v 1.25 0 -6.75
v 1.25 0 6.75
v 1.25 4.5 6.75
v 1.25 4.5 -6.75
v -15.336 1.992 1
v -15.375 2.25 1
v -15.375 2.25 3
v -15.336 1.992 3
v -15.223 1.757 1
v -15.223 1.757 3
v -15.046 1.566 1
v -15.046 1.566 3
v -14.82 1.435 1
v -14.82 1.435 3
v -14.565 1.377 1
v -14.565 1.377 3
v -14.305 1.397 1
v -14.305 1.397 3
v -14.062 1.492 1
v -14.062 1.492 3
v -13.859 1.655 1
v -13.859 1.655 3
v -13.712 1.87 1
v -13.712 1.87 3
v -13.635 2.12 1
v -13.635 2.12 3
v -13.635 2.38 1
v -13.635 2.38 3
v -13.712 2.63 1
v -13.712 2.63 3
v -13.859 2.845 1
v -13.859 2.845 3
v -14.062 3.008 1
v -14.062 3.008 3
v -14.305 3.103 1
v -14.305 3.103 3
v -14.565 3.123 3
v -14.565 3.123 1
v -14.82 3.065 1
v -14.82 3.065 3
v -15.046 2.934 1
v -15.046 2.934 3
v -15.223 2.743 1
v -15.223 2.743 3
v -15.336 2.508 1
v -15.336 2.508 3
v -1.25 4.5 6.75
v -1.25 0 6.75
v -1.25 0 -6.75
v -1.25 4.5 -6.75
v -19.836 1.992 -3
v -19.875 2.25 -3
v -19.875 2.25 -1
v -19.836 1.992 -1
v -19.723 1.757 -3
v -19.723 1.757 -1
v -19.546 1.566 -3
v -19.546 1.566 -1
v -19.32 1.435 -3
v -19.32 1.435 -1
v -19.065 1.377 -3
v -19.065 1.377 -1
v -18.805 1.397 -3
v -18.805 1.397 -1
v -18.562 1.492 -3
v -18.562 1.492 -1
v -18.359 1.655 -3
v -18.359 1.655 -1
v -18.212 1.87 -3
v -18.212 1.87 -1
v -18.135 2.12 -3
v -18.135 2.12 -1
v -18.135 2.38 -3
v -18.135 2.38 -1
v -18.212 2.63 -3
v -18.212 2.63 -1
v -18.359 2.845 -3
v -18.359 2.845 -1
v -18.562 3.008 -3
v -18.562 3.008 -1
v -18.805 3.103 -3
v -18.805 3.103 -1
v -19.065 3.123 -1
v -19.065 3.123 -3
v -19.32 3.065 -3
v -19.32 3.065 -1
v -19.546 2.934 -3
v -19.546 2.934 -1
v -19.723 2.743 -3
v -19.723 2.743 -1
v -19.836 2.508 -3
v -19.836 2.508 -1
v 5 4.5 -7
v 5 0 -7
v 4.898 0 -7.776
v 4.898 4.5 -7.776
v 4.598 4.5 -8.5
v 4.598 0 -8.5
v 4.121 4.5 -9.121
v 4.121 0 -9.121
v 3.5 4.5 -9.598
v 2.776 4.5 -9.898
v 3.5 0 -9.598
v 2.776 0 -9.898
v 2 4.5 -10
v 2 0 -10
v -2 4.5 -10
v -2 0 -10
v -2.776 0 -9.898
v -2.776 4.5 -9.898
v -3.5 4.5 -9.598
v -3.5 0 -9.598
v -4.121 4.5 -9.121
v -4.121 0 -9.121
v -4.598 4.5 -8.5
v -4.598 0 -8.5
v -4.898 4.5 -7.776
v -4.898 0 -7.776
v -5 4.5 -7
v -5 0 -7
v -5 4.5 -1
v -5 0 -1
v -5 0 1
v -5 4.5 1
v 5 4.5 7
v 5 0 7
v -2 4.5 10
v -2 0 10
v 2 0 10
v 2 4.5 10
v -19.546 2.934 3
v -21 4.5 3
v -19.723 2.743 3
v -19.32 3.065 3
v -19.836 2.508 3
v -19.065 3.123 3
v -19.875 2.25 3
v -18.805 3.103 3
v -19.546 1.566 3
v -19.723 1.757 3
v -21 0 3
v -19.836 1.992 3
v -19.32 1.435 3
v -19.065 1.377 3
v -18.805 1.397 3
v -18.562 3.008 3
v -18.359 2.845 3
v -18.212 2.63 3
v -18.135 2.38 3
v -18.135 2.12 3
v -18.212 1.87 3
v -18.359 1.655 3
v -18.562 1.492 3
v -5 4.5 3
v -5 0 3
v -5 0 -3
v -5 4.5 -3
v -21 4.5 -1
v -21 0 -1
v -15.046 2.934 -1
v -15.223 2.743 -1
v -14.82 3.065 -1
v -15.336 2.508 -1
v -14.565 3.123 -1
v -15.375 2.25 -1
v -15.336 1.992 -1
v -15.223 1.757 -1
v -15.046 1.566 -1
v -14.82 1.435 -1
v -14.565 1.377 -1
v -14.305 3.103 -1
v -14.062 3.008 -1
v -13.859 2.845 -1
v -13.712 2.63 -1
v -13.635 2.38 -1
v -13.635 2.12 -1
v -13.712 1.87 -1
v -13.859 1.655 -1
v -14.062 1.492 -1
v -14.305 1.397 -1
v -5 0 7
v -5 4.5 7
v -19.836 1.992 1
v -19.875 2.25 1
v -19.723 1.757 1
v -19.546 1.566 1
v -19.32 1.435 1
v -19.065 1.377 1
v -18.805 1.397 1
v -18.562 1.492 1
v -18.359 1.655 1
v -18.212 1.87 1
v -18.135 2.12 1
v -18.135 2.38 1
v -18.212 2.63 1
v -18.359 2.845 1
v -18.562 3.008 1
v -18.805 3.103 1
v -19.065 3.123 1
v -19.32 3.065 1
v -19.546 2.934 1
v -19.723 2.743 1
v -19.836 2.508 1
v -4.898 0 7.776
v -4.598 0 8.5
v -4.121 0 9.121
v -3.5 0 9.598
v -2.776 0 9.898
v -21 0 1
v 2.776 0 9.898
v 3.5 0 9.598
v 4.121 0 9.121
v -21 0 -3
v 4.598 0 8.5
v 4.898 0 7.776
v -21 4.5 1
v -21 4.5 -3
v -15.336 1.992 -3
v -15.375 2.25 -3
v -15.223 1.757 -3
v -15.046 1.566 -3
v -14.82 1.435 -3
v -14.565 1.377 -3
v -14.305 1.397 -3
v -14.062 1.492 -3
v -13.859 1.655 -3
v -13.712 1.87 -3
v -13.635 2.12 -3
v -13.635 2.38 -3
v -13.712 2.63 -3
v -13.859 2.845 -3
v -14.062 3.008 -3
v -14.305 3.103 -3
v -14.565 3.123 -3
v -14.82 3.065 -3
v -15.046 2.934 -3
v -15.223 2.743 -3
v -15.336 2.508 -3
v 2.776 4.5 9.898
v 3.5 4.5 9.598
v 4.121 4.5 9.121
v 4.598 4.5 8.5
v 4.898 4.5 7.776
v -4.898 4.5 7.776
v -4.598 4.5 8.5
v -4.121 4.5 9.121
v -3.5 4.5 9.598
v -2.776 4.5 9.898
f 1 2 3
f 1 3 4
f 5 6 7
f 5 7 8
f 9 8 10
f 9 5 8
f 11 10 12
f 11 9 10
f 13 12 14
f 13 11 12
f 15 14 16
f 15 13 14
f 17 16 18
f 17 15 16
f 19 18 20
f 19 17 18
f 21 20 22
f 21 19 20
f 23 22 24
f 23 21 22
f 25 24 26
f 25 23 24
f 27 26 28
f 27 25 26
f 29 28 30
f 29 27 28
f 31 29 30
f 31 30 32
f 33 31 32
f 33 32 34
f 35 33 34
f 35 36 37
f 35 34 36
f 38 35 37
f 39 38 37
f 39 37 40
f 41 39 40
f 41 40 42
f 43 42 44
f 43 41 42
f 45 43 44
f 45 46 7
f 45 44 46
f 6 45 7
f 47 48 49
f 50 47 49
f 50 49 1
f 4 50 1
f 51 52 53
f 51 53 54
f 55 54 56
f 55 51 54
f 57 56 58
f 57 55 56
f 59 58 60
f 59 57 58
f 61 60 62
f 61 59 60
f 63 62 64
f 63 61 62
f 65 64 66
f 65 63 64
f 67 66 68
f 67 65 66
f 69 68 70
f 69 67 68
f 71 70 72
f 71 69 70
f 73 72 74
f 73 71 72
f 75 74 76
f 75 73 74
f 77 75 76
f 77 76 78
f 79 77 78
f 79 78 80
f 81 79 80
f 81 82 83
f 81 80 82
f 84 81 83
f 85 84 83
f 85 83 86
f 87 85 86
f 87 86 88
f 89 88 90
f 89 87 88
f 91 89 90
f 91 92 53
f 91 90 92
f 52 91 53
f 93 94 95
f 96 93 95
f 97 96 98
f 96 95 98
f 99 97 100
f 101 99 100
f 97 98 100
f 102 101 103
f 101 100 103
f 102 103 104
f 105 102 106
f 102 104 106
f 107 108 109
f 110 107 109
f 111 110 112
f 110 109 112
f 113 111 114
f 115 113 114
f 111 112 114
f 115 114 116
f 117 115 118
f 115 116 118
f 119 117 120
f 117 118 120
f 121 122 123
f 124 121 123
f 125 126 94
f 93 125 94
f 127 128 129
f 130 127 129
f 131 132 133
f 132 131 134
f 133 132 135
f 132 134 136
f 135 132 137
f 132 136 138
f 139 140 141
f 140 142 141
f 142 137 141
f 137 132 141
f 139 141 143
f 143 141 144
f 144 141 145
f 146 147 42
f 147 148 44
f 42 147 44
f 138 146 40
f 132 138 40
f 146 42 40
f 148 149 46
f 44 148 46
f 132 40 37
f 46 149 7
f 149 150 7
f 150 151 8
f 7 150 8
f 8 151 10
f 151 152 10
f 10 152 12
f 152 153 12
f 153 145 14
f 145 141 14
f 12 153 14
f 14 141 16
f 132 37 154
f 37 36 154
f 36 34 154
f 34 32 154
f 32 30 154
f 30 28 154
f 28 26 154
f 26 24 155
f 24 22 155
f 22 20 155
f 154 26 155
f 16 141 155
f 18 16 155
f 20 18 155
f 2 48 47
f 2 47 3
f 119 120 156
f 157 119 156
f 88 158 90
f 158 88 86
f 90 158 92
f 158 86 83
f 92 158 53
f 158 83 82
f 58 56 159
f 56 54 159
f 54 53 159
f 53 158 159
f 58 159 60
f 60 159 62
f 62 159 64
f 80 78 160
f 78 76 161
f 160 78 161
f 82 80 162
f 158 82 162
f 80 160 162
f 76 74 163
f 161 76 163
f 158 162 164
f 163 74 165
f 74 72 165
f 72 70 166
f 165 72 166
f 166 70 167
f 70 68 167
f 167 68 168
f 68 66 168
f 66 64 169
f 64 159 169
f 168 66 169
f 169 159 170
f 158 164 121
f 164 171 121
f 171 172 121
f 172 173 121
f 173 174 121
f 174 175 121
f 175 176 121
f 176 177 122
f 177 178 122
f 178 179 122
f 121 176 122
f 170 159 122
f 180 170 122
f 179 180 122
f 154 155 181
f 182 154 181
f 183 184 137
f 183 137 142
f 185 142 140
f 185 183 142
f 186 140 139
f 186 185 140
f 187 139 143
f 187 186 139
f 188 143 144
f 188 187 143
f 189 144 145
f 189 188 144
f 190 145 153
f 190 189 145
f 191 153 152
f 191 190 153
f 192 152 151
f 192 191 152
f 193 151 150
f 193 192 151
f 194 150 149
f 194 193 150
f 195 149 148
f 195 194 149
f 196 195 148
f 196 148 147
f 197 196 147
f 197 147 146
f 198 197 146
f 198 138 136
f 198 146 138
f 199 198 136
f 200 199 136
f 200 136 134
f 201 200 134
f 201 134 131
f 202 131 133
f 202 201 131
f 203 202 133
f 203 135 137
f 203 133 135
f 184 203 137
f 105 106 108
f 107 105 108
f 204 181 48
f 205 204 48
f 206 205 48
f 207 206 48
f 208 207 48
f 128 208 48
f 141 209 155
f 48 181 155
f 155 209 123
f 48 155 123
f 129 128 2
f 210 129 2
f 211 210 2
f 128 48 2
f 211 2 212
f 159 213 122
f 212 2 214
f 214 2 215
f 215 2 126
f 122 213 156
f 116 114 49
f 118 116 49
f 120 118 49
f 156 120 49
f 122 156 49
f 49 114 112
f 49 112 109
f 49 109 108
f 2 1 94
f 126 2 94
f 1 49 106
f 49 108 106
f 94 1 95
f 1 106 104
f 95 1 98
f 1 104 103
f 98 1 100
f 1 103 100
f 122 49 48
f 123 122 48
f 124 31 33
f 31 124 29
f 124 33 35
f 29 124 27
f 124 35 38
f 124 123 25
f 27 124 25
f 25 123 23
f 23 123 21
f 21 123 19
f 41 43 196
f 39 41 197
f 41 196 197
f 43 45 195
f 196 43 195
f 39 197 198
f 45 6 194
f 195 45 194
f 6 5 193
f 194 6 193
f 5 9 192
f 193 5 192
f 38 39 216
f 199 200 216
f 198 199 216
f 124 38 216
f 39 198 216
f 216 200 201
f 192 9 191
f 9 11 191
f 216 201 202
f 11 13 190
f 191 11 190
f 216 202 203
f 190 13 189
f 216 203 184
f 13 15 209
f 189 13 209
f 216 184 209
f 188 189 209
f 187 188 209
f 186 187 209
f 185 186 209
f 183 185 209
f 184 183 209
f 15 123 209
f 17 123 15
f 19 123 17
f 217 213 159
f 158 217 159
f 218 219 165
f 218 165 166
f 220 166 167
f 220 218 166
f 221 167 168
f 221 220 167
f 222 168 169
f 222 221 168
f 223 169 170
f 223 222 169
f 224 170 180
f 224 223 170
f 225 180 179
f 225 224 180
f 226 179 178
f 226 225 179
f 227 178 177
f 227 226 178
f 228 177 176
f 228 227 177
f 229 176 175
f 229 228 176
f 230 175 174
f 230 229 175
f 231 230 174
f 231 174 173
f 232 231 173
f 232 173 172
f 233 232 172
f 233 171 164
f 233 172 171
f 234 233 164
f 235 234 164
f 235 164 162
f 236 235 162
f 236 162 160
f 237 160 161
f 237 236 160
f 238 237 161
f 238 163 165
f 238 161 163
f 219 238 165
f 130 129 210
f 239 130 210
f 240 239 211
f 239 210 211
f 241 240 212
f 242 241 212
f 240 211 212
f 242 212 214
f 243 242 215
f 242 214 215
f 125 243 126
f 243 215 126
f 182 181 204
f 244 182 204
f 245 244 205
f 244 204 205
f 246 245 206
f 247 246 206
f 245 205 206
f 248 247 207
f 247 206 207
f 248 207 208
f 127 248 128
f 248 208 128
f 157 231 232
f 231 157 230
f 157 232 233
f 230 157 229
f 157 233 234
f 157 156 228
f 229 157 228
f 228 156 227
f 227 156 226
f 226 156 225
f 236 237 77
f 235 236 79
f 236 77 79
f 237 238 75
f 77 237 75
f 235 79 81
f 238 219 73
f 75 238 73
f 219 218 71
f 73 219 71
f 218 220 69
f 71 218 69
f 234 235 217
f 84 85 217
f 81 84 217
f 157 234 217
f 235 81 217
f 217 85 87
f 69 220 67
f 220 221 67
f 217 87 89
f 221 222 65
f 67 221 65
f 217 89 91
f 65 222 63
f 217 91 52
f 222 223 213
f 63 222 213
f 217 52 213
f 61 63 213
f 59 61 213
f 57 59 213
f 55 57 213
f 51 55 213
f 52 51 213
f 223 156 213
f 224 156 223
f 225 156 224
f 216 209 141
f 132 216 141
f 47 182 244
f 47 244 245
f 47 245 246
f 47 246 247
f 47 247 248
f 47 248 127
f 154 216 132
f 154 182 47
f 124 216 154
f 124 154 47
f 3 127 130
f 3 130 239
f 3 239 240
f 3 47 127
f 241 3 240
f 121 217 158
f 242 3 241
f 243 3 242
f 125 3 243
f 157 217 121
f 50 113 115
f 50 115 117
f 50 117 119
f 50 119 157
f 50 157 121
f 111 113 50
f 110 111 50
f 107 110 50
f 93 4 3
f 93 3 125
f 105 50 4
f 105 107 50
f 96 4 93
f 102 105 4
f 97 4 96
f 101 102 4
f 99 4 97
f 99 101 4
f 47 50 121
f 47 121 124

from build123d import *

# Parameters (mm, degrees)
CROQUIS1_W                 = 2.5
CROQUIS1_H                 = 13.5
SALIENTE_EXTRUIR1_DEPTH    = 4.5
CORTAR_EXTRUIR4_DEPTH      = 10
CORTAR_EXTRUIR4_DEPTH_BACK = 26.104780421
CROQUIS7_R                 = 0.875


with BuildPart() as part:
    # Croquis1 → Saliente-Extruir1 (new body)
    with BuildSketch(Plane(origin=(0, 0, 0), x_dir=(1, 0, 0), z_dir=(0, 1, 0))):
        with BuildLine():
            Line((-2, -10), (2, -10))
            ThreePointArc((2, -10), (4.121320344, -9.121320344), (5, -7))
            Line((5, -7), (5, 7))
            ThreePointArc((5, 7), (4.121320344, 9.121320344), (2, 10))
            Line((2, 10), (-2, 10))
            ThreePointArc((-2, 10), (-4.121320344, 9.121320344), (-5, 7))
            Line((-5, 7), (-5, 3))
            Line((-5, 3), (-21, 3))
            Line((-21, 3), (-21, 1))
            Line((-21, 1), (-5, 1))
            Line((-5, 1), (-5, -1))
            Line((-5, -1), (-21, -1))
            Line((-21, -1), (-21, -3))
            Line((-21, -3), (-5, -3))
            Line((-5, -3), (-5, -7))
            ThreePointArc((-5, -7), (-4.121320344, -9.121320344), (-2, -10))
        make_face()
        Rectangle(CROQUIS1_W, CROQUIS1_H, mode=Mode.SUBTRACT)
    extrude(amount=SALIENTE_EXTRUIR1_DEPTH)

    # Croquis7 → Cortar-Extruir4 (cut, two sides: drawn at the far end of the back side and taken through both)
    with BuildSketch(Plane.XY.offset(3).offset(-CORTAR_EXTRUIR4_DEPTH_BACK)):
        with Locations(Location((-19, 2.25, 0), (0, 0, 180))):
            Circle(CROQUIS7_R)
        with Locations(Location((-14.5, 2.25, 0), (0, 0, 180))):
            Circle(CROQUIS7_R)
    extrude(amount=CORTAR_EXTRUIR4_DEPTH + CORTAR_EXTRUIR4_DEPTH_BACK, mode=Mode.SUBTRACT)


solid = part.part
